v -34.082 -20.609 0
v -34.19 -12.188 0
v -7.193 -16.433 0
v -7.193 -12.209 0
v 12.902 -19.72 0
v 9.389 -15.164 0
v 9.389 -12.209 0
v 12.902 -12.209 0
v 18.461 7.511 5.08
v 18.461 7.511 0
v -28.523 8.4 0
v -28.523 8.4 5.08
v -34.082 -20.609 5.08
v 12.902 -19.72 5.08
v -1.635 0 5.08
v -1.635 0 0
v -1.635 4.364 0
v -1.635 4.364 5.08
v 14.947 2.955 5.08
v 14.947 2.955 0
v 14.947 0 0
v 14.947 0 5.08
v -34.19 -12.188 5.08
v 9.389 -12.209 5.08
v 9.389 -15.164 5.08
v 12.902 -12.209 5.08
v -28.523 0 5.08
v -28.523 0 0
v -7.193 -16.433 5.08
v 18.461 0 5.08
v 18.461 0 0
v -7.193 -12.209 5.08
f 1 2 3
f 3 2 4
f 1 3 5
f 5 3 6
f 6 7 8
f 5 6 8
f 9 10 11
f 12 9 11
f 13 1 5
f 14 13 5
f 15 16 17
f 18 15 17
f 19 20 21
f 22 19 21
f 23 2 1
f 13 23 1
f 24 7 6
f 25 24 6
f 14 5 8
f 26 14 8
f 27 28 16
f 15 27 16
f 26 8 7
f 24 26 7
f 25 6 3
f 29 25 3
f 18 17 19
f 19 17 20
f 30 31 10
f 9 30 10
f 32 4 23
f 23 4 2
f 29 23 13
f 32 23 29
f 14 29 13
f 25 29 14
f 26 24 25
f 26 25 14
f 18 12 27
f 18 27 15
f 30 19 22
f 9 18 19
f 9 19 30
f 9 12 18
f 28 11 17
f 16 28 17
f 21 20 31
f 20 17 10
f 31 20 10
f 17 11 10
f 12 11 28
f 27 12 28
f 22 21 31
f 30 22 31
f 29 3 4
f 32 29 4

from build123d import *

# Parameters (mm, degrees)
F1_DEPTH = 5.08
F3_DEPTH = 5.08


# Not quite as in the source:
# - ends of sketch curves that miss each other by under 0.0002 mm in the source are joined


with BuildPart() as f1:
    # F0 (on Top) → F1 (new body)
    with BuildSketch(Plane.XY):
        Polygon((18.4606127441, 0), (18.4606127441, 7.51117242), (-28.5233613104, 8.40017242), (-28.5233613104, 0), (-1.6348321224, 0), (-1.6348321224, 4.1214697994), (-1.6348321224, 4.36431868), (14.9467270821, 2.9550751206), (14.9467270821, 0), align=None)
    extrude(amount=F1_DEPTH)


with BuildPart() as f3:
    # F2 (on Top) → F3 (new body)
    with BuildSketch(Plane.XY):
        Polygon((-7.1930428014, -16.4325327125), (-7.1930428014, -12.2086521793), (-34.1898388486, -12.1878198983), (-34.0815179727, -20.6088316595), (12.9024560817, -19.7198316595), (12.9024560817, -12.2086592395), (9.3885704198, -12.2086592395), (9.3885704198, -15.16373436), align=None)
    extrude(amount=F3_DEPTH)


solid = Compound([f1.part, f3.part])
